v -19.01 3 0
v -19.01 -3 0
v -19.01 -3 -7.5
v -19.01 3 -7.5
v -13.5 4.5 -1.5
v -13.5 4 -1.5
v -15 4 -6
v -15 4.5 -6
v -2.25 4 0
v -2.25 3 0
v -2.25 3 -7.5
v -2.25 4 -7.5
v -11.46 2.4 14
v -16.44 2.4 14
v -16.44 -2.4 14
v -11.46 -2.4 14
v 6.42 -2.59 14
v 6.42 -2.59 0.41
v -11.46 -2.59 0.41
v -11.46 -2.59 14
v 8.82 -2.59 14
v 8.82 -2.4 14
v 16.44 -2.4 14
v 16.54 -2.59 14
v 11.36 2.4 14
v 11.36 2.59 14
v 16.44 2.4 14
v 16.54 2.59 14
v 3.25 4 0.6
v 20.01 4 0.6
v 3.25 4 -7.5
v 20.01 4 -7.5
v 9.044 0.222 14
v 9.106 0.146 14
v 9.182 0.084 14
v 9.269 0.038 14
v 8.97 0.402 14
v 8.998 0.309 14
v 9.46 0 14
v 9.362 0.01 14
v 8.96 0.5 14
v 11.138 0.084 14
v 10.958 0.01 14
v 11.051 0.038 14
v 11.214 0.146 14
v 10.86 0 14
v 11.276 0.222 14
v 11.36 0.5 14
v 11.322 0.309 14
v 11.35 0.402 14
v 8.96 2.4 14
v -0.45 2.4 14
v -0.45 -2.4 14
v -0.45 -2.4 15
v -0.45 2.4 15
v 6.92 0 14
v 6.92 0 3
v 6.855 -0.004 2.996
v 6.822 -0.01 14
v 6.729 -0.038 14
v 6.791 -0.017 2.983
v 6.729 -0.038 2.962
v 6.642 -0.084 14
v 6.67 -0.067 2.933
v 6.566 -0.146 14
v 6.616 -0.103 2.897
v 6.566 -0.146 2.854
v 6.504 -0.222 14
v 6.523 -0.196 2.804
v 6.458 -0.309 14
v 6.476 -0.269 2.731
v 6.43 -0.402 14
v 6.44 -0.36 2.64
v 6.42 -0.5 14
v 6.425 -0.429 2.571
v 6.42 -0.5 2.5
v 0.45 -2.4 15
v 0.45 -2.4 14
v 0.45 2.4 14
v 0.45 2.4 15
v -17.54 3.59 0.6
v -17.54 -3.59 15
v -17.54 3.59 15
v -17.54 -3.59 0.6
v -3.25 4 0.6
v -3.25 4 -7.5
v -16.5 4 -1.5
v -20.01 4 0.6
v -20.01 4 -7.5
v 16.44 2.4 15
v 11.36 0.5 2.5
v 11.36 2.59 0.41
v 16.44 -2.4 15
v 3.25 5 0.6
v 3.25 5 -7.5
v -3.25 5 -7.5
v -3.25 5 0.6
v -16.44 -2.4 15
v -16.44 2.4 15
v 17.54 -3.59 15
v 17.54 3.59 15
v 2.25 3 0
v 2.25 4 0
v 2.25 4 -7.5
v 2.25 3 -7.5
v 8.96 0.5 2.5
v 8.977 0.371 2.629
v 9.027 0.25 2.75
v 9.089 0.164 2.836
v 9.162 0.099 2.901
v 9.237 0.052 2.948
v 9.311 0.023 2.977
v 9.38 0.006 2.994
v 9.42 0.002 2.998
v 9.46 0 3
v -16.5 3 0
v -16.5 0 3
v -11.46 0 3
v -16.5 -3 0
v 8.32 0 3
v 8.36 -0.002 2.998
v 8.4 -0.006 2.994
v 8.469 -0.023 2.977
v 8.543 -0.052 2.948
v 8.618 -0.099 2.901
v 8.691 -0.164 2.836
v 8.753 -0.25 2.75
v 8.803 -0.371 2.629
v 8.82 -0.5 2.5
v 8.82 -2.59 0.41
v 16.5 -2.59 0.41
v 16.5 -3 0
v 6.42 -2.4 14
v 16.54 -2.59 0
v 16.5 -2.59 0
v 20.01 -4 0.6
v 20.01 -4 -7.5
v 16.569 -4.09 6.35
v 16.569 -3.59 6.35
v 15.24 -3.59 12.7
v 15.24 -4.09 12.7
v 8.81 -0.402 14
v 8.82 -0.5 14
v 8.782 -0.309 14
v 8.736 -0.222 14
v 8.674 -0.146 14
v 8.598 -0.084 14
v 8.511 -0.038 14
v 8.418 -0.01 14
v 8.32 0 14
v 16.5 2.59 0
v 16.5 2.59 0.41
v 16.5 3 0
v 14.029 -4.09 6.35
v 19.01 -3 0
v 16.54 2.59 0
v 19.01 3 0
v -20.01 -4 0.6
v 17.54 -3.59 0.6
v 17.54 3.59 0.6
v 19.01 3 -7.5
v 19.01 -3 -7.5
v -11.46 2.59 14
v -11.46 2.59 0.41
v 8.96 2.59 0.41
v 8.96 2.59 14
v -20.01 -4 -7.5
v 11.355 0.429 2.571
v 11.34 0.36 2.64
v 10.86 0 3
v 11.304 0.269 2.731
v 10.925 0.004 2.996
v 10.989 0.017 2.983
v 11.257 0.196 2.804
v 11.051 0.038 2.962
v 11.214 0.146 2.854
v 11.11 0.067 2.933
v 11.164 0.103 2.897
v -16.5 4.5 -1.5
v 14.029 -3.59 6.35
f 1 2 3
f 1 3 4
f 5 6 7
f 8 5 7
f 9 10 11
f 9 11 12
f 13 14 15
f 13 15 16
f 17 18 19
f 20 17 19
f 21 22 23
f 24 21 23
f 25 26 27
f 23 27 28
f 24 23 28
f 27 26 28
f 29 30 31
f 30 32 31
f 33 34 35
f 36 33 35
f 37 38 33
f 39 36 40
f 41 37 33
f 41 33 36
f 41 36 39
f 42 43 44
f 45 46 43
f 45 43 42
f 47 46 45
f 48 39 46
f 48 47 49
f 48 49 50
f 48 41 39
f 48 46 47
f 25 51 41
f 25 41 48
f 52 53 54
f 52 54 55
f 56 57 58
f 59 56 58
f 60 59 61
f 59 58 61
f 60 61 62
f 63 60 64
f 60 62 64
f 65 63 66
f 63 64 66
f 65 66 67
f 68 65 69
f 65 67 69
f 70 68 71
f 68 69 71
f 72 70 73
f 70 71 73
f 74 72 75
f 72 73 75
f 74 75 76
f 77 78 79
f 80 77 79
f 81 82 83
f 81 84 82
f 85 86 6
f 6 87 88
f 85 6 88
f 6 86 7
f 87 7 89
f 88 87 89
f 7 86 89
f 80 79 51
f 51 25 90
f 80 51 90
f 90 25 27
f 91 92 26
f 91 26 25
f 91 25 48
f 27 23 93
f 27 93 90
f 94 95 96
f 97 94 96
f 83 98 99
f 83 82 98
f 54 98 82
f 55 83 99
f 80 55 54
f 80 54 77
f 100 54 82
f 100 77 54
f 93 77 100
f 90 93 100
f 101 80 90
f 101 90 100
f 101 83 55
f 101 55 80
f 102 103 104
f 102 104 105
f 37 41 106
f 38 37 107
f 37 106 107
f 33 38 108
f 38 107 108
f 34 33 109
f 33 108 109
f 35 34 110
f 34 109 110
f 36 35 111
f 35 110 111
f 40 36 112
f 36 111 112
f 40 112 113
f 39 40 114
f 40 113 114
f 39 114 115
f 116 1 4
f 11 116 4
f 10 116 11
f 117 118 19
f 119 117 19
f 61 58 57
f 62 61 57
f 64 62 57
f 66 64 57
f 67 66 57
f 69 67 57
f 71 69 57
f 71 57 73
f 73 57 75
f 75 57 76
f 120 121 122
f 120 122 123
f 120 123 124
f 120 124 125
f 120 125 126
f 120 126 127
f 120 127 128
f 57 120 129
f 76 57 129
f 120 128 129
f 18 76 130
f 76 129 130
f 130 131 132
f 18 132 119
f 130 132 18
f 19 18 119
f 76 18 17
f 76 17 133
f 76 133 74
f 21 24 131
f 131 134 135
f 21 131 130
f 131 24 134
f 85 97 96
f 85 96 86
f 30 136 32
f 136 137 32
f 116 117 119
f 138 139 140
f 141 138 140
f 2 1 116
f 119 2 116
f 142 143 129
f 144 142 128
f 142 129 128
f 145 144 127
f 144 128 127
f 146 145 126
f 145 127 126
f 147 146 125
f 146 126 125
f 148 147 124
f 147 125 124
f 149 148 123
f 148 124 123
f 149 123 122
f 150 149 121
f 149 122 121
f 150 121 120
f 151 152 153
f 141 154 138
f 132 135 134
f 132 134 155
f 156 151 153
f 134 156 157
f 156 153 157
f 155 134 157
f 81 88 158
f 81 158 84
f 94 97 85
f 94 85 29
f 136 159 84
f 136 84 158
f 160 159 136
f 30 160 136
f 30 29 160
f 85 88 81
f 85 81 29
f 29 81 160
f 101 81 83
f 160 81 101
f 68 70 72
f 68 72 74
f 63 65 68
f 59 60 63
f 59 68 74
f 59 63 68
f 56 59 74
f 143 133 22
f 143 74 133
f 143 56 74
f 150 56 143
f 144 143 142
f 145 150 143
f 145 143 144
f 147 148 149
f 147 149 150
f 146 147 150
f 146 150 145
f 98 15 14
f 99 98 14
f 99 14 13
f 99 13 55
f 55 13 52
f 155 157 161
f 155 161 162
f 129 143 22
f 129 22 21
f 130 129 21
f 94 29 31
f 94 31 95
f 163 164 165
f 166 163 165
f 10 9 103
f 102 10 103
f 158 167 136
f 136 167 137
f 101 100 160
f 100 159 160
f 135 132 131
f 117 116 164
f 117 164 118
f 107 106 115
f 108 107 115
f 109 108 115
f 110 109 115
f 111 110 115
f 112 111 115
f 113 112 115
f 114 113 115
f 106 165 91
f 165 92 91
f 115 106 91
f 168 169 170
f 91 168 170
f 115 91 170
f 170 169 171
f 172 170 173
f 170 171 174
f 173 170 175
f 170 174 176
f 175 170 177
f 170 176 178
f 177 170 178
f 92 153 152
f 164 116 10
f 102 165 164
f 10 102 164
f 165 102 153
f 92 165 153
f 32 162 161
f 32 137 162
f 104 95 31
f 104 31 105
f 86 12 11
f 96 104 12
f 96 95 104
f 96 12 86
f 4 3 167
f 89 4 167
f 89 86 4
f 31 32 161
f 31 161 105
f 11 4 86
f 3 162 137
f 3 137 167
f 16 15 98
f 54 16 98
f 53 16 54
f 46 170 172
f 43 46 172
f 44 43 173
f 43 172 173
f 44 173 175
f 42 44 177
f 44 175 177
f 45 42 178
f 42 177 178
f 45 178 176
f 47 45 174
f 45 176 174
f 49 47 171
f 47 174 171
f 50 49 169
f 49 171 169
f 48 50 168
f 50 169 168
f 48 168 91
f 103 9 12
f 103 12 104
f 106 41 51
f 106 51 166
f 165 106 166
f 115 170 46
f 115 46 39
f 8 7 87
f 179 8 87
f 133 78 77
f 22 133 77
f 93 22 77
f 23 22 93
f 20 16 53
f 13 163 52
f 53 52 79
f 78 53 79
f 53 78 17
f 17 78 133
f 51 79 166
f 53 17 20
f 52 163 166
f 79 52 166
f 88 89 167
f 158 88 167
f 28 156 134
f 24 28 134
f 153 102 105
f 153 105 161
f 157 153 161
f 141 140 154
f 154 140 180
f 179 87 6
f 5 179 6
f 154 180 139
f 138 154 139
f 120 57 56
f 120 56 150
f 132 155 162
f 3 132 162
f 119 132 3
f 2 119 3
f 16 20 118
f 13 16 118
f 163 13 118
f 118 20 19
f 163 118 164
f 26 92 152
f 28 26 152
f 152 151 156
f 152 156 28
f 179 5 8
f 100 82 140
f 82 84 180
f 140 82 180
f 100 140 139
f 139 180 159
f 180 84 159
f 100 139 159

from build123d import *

# Parameters (mm, degrees)
PAD_DEPTH     = 7.5
SKETCH002_W   = 34
SKETCH002_H   = 6.8
PAD001_DEPTH  = 0.6
SKETCH001_W   = 35.08
SKETCH001_H   = 7.18
PAD002_DEPTH  = 14
PAD003_DEPTH  = 0.5
PAD004_DEPTH  = 0.5
SKETCH005_W   = 35.08
SKETCH005_H   = 7.18
SKETCH005_W_2 = 15.99
SKETCH005_H_2 = 4.8
PAD005_DEPTH  = 1
POCKET_DEPTH  = 16.5


with BuildPart() as part:
    # Sketch → Pad (new body)
    with BuildSketch(Plane.XY):
        Polygon((-20.01, 4), (-3.25, 4), (-3.25, 5), (3.25, 5), (3.25, 4), (20.01, 4), (20.01, -4), (-20.01, -4), align=None)
        Polygon((-19.01, 3), (-2.25, 3), (-2.25, 4), (2.25, 4), (2.25, 3), (19.01, 3), (19.01, -3), (-19.01, -3), align=None, mode=Mode.SUBTRACT)
    extrude(amount=-PAD_DEPTH)

    # Sketch002 → Pad001 (join)
    with BuildSketch(Plane.XY):
        Polygon((-20.01, 4), (-20.01, -4), (20.01, -4), (20.01, 4), (3.25, 4), (3.25, 5), (-3.25, 5), (-3.25, 4), align=None)
        Rectangle(SKETCH002_W, SKETCH002_H, mode=Mode.SUBTRACT)
    extrude(amount=PAD001_DEPTH)

    # Sketch001 → Pad002 (join)
    with BuildSketch(Plane.XY):
        Rectangle(SKETCH001_W, SKETCH001_H)
        with BuildLine():
            Line((16.54, 2.59), (16.54, -2.59))
            Line((16.54, -2.59), (8.82, -2.59))
            Line((8.82, -0.5), (8.82, -2.59))
            ThreePointArc((8.82, -0.5), (8.673553, -0.146447), (8.32, 0))
            Line((6.92, 0), (8.32, 0))
            ThreePointArc((6.92, 0), (6.566447, -0.146447), (6.42, -0.5))
            Line((6.42, -2.59), (6.42, -0.5))
            Line((6.42, -2.59), (-11.46, -2.59))
            Line((-11.46, -2.59), (-11.46, 2.59))
            Line((-11.46, 2.59), (8.96, 2.59))
            Line((8.96, 0.5), (8.96, 2.59))
            ThreePointArc((8.96, 0.5), (9.106447, 0.146447), (9.46, 0))
            Line((10.86, 0), (9.46, 0))
            ThreePointArc((10.86, 0), (11.213553, 0.146447), (11.36, 0.5))
            Line((11.36, 2.59), (11.36, 0.5))
            Line((11.36, 2.59), (16.54, 2.59))
        make_face(mode=Mode.SUBTRACT)
    extrude(amount=PAD002_DEPTH)

    # Sketch003 (on Face1 of Pad) → Pad003 (join)
    with BuildSketch(Plane(origin=(0, 4, 0), x_dir=(-1, 0, 0), z_dir=(0, 1, 0))):
        Polygon((15, -6), (16.5, -1.5), (13.5, -1.5), align=None)
    extrude(amount=PAD003_DEPTH)

    # Sketch004 (on Face33 of Pad003) → Pad004 (join)
    with BuildSketch(Plane.XZ.offset(3.59)):
        Polygon((16.568533, 6.35), (15.24, 12.7), (14.028533, 6.35), align=None)
    extrude(amount=PAD004_DEPTH)

    # Sketch005 → Pad005 (join)
    with BuildSketch(Plane.XY.offset(14)):
        Rectangle(SKETCH005_W, SKETCH005_H)
        with Locations((-8.445, 0)):
            Rectangle(SKETCH005_W_2, SKETCH005_H_2, mode=Mode.SUBTRACT)
        with Locations((8.445, 0)):
            Rectangle(SKETCH005_W_2, SKETCH005_H_2, mode=Mode.SUBTRACT)
    extrude(amount=PAD005_DEPTH)

    # Sketch006 → Pocket (cut, symmetric)
    with BuildSketch(Plane.YZ):
        Polygon((-3, 0), (-3, -1), (3, -1), (3, 0), (0, 3), align=None)
    extrude(amount=POCKET_DEPTH, both=True, mode=Mode.SUBTRACT)


solid = part.part
